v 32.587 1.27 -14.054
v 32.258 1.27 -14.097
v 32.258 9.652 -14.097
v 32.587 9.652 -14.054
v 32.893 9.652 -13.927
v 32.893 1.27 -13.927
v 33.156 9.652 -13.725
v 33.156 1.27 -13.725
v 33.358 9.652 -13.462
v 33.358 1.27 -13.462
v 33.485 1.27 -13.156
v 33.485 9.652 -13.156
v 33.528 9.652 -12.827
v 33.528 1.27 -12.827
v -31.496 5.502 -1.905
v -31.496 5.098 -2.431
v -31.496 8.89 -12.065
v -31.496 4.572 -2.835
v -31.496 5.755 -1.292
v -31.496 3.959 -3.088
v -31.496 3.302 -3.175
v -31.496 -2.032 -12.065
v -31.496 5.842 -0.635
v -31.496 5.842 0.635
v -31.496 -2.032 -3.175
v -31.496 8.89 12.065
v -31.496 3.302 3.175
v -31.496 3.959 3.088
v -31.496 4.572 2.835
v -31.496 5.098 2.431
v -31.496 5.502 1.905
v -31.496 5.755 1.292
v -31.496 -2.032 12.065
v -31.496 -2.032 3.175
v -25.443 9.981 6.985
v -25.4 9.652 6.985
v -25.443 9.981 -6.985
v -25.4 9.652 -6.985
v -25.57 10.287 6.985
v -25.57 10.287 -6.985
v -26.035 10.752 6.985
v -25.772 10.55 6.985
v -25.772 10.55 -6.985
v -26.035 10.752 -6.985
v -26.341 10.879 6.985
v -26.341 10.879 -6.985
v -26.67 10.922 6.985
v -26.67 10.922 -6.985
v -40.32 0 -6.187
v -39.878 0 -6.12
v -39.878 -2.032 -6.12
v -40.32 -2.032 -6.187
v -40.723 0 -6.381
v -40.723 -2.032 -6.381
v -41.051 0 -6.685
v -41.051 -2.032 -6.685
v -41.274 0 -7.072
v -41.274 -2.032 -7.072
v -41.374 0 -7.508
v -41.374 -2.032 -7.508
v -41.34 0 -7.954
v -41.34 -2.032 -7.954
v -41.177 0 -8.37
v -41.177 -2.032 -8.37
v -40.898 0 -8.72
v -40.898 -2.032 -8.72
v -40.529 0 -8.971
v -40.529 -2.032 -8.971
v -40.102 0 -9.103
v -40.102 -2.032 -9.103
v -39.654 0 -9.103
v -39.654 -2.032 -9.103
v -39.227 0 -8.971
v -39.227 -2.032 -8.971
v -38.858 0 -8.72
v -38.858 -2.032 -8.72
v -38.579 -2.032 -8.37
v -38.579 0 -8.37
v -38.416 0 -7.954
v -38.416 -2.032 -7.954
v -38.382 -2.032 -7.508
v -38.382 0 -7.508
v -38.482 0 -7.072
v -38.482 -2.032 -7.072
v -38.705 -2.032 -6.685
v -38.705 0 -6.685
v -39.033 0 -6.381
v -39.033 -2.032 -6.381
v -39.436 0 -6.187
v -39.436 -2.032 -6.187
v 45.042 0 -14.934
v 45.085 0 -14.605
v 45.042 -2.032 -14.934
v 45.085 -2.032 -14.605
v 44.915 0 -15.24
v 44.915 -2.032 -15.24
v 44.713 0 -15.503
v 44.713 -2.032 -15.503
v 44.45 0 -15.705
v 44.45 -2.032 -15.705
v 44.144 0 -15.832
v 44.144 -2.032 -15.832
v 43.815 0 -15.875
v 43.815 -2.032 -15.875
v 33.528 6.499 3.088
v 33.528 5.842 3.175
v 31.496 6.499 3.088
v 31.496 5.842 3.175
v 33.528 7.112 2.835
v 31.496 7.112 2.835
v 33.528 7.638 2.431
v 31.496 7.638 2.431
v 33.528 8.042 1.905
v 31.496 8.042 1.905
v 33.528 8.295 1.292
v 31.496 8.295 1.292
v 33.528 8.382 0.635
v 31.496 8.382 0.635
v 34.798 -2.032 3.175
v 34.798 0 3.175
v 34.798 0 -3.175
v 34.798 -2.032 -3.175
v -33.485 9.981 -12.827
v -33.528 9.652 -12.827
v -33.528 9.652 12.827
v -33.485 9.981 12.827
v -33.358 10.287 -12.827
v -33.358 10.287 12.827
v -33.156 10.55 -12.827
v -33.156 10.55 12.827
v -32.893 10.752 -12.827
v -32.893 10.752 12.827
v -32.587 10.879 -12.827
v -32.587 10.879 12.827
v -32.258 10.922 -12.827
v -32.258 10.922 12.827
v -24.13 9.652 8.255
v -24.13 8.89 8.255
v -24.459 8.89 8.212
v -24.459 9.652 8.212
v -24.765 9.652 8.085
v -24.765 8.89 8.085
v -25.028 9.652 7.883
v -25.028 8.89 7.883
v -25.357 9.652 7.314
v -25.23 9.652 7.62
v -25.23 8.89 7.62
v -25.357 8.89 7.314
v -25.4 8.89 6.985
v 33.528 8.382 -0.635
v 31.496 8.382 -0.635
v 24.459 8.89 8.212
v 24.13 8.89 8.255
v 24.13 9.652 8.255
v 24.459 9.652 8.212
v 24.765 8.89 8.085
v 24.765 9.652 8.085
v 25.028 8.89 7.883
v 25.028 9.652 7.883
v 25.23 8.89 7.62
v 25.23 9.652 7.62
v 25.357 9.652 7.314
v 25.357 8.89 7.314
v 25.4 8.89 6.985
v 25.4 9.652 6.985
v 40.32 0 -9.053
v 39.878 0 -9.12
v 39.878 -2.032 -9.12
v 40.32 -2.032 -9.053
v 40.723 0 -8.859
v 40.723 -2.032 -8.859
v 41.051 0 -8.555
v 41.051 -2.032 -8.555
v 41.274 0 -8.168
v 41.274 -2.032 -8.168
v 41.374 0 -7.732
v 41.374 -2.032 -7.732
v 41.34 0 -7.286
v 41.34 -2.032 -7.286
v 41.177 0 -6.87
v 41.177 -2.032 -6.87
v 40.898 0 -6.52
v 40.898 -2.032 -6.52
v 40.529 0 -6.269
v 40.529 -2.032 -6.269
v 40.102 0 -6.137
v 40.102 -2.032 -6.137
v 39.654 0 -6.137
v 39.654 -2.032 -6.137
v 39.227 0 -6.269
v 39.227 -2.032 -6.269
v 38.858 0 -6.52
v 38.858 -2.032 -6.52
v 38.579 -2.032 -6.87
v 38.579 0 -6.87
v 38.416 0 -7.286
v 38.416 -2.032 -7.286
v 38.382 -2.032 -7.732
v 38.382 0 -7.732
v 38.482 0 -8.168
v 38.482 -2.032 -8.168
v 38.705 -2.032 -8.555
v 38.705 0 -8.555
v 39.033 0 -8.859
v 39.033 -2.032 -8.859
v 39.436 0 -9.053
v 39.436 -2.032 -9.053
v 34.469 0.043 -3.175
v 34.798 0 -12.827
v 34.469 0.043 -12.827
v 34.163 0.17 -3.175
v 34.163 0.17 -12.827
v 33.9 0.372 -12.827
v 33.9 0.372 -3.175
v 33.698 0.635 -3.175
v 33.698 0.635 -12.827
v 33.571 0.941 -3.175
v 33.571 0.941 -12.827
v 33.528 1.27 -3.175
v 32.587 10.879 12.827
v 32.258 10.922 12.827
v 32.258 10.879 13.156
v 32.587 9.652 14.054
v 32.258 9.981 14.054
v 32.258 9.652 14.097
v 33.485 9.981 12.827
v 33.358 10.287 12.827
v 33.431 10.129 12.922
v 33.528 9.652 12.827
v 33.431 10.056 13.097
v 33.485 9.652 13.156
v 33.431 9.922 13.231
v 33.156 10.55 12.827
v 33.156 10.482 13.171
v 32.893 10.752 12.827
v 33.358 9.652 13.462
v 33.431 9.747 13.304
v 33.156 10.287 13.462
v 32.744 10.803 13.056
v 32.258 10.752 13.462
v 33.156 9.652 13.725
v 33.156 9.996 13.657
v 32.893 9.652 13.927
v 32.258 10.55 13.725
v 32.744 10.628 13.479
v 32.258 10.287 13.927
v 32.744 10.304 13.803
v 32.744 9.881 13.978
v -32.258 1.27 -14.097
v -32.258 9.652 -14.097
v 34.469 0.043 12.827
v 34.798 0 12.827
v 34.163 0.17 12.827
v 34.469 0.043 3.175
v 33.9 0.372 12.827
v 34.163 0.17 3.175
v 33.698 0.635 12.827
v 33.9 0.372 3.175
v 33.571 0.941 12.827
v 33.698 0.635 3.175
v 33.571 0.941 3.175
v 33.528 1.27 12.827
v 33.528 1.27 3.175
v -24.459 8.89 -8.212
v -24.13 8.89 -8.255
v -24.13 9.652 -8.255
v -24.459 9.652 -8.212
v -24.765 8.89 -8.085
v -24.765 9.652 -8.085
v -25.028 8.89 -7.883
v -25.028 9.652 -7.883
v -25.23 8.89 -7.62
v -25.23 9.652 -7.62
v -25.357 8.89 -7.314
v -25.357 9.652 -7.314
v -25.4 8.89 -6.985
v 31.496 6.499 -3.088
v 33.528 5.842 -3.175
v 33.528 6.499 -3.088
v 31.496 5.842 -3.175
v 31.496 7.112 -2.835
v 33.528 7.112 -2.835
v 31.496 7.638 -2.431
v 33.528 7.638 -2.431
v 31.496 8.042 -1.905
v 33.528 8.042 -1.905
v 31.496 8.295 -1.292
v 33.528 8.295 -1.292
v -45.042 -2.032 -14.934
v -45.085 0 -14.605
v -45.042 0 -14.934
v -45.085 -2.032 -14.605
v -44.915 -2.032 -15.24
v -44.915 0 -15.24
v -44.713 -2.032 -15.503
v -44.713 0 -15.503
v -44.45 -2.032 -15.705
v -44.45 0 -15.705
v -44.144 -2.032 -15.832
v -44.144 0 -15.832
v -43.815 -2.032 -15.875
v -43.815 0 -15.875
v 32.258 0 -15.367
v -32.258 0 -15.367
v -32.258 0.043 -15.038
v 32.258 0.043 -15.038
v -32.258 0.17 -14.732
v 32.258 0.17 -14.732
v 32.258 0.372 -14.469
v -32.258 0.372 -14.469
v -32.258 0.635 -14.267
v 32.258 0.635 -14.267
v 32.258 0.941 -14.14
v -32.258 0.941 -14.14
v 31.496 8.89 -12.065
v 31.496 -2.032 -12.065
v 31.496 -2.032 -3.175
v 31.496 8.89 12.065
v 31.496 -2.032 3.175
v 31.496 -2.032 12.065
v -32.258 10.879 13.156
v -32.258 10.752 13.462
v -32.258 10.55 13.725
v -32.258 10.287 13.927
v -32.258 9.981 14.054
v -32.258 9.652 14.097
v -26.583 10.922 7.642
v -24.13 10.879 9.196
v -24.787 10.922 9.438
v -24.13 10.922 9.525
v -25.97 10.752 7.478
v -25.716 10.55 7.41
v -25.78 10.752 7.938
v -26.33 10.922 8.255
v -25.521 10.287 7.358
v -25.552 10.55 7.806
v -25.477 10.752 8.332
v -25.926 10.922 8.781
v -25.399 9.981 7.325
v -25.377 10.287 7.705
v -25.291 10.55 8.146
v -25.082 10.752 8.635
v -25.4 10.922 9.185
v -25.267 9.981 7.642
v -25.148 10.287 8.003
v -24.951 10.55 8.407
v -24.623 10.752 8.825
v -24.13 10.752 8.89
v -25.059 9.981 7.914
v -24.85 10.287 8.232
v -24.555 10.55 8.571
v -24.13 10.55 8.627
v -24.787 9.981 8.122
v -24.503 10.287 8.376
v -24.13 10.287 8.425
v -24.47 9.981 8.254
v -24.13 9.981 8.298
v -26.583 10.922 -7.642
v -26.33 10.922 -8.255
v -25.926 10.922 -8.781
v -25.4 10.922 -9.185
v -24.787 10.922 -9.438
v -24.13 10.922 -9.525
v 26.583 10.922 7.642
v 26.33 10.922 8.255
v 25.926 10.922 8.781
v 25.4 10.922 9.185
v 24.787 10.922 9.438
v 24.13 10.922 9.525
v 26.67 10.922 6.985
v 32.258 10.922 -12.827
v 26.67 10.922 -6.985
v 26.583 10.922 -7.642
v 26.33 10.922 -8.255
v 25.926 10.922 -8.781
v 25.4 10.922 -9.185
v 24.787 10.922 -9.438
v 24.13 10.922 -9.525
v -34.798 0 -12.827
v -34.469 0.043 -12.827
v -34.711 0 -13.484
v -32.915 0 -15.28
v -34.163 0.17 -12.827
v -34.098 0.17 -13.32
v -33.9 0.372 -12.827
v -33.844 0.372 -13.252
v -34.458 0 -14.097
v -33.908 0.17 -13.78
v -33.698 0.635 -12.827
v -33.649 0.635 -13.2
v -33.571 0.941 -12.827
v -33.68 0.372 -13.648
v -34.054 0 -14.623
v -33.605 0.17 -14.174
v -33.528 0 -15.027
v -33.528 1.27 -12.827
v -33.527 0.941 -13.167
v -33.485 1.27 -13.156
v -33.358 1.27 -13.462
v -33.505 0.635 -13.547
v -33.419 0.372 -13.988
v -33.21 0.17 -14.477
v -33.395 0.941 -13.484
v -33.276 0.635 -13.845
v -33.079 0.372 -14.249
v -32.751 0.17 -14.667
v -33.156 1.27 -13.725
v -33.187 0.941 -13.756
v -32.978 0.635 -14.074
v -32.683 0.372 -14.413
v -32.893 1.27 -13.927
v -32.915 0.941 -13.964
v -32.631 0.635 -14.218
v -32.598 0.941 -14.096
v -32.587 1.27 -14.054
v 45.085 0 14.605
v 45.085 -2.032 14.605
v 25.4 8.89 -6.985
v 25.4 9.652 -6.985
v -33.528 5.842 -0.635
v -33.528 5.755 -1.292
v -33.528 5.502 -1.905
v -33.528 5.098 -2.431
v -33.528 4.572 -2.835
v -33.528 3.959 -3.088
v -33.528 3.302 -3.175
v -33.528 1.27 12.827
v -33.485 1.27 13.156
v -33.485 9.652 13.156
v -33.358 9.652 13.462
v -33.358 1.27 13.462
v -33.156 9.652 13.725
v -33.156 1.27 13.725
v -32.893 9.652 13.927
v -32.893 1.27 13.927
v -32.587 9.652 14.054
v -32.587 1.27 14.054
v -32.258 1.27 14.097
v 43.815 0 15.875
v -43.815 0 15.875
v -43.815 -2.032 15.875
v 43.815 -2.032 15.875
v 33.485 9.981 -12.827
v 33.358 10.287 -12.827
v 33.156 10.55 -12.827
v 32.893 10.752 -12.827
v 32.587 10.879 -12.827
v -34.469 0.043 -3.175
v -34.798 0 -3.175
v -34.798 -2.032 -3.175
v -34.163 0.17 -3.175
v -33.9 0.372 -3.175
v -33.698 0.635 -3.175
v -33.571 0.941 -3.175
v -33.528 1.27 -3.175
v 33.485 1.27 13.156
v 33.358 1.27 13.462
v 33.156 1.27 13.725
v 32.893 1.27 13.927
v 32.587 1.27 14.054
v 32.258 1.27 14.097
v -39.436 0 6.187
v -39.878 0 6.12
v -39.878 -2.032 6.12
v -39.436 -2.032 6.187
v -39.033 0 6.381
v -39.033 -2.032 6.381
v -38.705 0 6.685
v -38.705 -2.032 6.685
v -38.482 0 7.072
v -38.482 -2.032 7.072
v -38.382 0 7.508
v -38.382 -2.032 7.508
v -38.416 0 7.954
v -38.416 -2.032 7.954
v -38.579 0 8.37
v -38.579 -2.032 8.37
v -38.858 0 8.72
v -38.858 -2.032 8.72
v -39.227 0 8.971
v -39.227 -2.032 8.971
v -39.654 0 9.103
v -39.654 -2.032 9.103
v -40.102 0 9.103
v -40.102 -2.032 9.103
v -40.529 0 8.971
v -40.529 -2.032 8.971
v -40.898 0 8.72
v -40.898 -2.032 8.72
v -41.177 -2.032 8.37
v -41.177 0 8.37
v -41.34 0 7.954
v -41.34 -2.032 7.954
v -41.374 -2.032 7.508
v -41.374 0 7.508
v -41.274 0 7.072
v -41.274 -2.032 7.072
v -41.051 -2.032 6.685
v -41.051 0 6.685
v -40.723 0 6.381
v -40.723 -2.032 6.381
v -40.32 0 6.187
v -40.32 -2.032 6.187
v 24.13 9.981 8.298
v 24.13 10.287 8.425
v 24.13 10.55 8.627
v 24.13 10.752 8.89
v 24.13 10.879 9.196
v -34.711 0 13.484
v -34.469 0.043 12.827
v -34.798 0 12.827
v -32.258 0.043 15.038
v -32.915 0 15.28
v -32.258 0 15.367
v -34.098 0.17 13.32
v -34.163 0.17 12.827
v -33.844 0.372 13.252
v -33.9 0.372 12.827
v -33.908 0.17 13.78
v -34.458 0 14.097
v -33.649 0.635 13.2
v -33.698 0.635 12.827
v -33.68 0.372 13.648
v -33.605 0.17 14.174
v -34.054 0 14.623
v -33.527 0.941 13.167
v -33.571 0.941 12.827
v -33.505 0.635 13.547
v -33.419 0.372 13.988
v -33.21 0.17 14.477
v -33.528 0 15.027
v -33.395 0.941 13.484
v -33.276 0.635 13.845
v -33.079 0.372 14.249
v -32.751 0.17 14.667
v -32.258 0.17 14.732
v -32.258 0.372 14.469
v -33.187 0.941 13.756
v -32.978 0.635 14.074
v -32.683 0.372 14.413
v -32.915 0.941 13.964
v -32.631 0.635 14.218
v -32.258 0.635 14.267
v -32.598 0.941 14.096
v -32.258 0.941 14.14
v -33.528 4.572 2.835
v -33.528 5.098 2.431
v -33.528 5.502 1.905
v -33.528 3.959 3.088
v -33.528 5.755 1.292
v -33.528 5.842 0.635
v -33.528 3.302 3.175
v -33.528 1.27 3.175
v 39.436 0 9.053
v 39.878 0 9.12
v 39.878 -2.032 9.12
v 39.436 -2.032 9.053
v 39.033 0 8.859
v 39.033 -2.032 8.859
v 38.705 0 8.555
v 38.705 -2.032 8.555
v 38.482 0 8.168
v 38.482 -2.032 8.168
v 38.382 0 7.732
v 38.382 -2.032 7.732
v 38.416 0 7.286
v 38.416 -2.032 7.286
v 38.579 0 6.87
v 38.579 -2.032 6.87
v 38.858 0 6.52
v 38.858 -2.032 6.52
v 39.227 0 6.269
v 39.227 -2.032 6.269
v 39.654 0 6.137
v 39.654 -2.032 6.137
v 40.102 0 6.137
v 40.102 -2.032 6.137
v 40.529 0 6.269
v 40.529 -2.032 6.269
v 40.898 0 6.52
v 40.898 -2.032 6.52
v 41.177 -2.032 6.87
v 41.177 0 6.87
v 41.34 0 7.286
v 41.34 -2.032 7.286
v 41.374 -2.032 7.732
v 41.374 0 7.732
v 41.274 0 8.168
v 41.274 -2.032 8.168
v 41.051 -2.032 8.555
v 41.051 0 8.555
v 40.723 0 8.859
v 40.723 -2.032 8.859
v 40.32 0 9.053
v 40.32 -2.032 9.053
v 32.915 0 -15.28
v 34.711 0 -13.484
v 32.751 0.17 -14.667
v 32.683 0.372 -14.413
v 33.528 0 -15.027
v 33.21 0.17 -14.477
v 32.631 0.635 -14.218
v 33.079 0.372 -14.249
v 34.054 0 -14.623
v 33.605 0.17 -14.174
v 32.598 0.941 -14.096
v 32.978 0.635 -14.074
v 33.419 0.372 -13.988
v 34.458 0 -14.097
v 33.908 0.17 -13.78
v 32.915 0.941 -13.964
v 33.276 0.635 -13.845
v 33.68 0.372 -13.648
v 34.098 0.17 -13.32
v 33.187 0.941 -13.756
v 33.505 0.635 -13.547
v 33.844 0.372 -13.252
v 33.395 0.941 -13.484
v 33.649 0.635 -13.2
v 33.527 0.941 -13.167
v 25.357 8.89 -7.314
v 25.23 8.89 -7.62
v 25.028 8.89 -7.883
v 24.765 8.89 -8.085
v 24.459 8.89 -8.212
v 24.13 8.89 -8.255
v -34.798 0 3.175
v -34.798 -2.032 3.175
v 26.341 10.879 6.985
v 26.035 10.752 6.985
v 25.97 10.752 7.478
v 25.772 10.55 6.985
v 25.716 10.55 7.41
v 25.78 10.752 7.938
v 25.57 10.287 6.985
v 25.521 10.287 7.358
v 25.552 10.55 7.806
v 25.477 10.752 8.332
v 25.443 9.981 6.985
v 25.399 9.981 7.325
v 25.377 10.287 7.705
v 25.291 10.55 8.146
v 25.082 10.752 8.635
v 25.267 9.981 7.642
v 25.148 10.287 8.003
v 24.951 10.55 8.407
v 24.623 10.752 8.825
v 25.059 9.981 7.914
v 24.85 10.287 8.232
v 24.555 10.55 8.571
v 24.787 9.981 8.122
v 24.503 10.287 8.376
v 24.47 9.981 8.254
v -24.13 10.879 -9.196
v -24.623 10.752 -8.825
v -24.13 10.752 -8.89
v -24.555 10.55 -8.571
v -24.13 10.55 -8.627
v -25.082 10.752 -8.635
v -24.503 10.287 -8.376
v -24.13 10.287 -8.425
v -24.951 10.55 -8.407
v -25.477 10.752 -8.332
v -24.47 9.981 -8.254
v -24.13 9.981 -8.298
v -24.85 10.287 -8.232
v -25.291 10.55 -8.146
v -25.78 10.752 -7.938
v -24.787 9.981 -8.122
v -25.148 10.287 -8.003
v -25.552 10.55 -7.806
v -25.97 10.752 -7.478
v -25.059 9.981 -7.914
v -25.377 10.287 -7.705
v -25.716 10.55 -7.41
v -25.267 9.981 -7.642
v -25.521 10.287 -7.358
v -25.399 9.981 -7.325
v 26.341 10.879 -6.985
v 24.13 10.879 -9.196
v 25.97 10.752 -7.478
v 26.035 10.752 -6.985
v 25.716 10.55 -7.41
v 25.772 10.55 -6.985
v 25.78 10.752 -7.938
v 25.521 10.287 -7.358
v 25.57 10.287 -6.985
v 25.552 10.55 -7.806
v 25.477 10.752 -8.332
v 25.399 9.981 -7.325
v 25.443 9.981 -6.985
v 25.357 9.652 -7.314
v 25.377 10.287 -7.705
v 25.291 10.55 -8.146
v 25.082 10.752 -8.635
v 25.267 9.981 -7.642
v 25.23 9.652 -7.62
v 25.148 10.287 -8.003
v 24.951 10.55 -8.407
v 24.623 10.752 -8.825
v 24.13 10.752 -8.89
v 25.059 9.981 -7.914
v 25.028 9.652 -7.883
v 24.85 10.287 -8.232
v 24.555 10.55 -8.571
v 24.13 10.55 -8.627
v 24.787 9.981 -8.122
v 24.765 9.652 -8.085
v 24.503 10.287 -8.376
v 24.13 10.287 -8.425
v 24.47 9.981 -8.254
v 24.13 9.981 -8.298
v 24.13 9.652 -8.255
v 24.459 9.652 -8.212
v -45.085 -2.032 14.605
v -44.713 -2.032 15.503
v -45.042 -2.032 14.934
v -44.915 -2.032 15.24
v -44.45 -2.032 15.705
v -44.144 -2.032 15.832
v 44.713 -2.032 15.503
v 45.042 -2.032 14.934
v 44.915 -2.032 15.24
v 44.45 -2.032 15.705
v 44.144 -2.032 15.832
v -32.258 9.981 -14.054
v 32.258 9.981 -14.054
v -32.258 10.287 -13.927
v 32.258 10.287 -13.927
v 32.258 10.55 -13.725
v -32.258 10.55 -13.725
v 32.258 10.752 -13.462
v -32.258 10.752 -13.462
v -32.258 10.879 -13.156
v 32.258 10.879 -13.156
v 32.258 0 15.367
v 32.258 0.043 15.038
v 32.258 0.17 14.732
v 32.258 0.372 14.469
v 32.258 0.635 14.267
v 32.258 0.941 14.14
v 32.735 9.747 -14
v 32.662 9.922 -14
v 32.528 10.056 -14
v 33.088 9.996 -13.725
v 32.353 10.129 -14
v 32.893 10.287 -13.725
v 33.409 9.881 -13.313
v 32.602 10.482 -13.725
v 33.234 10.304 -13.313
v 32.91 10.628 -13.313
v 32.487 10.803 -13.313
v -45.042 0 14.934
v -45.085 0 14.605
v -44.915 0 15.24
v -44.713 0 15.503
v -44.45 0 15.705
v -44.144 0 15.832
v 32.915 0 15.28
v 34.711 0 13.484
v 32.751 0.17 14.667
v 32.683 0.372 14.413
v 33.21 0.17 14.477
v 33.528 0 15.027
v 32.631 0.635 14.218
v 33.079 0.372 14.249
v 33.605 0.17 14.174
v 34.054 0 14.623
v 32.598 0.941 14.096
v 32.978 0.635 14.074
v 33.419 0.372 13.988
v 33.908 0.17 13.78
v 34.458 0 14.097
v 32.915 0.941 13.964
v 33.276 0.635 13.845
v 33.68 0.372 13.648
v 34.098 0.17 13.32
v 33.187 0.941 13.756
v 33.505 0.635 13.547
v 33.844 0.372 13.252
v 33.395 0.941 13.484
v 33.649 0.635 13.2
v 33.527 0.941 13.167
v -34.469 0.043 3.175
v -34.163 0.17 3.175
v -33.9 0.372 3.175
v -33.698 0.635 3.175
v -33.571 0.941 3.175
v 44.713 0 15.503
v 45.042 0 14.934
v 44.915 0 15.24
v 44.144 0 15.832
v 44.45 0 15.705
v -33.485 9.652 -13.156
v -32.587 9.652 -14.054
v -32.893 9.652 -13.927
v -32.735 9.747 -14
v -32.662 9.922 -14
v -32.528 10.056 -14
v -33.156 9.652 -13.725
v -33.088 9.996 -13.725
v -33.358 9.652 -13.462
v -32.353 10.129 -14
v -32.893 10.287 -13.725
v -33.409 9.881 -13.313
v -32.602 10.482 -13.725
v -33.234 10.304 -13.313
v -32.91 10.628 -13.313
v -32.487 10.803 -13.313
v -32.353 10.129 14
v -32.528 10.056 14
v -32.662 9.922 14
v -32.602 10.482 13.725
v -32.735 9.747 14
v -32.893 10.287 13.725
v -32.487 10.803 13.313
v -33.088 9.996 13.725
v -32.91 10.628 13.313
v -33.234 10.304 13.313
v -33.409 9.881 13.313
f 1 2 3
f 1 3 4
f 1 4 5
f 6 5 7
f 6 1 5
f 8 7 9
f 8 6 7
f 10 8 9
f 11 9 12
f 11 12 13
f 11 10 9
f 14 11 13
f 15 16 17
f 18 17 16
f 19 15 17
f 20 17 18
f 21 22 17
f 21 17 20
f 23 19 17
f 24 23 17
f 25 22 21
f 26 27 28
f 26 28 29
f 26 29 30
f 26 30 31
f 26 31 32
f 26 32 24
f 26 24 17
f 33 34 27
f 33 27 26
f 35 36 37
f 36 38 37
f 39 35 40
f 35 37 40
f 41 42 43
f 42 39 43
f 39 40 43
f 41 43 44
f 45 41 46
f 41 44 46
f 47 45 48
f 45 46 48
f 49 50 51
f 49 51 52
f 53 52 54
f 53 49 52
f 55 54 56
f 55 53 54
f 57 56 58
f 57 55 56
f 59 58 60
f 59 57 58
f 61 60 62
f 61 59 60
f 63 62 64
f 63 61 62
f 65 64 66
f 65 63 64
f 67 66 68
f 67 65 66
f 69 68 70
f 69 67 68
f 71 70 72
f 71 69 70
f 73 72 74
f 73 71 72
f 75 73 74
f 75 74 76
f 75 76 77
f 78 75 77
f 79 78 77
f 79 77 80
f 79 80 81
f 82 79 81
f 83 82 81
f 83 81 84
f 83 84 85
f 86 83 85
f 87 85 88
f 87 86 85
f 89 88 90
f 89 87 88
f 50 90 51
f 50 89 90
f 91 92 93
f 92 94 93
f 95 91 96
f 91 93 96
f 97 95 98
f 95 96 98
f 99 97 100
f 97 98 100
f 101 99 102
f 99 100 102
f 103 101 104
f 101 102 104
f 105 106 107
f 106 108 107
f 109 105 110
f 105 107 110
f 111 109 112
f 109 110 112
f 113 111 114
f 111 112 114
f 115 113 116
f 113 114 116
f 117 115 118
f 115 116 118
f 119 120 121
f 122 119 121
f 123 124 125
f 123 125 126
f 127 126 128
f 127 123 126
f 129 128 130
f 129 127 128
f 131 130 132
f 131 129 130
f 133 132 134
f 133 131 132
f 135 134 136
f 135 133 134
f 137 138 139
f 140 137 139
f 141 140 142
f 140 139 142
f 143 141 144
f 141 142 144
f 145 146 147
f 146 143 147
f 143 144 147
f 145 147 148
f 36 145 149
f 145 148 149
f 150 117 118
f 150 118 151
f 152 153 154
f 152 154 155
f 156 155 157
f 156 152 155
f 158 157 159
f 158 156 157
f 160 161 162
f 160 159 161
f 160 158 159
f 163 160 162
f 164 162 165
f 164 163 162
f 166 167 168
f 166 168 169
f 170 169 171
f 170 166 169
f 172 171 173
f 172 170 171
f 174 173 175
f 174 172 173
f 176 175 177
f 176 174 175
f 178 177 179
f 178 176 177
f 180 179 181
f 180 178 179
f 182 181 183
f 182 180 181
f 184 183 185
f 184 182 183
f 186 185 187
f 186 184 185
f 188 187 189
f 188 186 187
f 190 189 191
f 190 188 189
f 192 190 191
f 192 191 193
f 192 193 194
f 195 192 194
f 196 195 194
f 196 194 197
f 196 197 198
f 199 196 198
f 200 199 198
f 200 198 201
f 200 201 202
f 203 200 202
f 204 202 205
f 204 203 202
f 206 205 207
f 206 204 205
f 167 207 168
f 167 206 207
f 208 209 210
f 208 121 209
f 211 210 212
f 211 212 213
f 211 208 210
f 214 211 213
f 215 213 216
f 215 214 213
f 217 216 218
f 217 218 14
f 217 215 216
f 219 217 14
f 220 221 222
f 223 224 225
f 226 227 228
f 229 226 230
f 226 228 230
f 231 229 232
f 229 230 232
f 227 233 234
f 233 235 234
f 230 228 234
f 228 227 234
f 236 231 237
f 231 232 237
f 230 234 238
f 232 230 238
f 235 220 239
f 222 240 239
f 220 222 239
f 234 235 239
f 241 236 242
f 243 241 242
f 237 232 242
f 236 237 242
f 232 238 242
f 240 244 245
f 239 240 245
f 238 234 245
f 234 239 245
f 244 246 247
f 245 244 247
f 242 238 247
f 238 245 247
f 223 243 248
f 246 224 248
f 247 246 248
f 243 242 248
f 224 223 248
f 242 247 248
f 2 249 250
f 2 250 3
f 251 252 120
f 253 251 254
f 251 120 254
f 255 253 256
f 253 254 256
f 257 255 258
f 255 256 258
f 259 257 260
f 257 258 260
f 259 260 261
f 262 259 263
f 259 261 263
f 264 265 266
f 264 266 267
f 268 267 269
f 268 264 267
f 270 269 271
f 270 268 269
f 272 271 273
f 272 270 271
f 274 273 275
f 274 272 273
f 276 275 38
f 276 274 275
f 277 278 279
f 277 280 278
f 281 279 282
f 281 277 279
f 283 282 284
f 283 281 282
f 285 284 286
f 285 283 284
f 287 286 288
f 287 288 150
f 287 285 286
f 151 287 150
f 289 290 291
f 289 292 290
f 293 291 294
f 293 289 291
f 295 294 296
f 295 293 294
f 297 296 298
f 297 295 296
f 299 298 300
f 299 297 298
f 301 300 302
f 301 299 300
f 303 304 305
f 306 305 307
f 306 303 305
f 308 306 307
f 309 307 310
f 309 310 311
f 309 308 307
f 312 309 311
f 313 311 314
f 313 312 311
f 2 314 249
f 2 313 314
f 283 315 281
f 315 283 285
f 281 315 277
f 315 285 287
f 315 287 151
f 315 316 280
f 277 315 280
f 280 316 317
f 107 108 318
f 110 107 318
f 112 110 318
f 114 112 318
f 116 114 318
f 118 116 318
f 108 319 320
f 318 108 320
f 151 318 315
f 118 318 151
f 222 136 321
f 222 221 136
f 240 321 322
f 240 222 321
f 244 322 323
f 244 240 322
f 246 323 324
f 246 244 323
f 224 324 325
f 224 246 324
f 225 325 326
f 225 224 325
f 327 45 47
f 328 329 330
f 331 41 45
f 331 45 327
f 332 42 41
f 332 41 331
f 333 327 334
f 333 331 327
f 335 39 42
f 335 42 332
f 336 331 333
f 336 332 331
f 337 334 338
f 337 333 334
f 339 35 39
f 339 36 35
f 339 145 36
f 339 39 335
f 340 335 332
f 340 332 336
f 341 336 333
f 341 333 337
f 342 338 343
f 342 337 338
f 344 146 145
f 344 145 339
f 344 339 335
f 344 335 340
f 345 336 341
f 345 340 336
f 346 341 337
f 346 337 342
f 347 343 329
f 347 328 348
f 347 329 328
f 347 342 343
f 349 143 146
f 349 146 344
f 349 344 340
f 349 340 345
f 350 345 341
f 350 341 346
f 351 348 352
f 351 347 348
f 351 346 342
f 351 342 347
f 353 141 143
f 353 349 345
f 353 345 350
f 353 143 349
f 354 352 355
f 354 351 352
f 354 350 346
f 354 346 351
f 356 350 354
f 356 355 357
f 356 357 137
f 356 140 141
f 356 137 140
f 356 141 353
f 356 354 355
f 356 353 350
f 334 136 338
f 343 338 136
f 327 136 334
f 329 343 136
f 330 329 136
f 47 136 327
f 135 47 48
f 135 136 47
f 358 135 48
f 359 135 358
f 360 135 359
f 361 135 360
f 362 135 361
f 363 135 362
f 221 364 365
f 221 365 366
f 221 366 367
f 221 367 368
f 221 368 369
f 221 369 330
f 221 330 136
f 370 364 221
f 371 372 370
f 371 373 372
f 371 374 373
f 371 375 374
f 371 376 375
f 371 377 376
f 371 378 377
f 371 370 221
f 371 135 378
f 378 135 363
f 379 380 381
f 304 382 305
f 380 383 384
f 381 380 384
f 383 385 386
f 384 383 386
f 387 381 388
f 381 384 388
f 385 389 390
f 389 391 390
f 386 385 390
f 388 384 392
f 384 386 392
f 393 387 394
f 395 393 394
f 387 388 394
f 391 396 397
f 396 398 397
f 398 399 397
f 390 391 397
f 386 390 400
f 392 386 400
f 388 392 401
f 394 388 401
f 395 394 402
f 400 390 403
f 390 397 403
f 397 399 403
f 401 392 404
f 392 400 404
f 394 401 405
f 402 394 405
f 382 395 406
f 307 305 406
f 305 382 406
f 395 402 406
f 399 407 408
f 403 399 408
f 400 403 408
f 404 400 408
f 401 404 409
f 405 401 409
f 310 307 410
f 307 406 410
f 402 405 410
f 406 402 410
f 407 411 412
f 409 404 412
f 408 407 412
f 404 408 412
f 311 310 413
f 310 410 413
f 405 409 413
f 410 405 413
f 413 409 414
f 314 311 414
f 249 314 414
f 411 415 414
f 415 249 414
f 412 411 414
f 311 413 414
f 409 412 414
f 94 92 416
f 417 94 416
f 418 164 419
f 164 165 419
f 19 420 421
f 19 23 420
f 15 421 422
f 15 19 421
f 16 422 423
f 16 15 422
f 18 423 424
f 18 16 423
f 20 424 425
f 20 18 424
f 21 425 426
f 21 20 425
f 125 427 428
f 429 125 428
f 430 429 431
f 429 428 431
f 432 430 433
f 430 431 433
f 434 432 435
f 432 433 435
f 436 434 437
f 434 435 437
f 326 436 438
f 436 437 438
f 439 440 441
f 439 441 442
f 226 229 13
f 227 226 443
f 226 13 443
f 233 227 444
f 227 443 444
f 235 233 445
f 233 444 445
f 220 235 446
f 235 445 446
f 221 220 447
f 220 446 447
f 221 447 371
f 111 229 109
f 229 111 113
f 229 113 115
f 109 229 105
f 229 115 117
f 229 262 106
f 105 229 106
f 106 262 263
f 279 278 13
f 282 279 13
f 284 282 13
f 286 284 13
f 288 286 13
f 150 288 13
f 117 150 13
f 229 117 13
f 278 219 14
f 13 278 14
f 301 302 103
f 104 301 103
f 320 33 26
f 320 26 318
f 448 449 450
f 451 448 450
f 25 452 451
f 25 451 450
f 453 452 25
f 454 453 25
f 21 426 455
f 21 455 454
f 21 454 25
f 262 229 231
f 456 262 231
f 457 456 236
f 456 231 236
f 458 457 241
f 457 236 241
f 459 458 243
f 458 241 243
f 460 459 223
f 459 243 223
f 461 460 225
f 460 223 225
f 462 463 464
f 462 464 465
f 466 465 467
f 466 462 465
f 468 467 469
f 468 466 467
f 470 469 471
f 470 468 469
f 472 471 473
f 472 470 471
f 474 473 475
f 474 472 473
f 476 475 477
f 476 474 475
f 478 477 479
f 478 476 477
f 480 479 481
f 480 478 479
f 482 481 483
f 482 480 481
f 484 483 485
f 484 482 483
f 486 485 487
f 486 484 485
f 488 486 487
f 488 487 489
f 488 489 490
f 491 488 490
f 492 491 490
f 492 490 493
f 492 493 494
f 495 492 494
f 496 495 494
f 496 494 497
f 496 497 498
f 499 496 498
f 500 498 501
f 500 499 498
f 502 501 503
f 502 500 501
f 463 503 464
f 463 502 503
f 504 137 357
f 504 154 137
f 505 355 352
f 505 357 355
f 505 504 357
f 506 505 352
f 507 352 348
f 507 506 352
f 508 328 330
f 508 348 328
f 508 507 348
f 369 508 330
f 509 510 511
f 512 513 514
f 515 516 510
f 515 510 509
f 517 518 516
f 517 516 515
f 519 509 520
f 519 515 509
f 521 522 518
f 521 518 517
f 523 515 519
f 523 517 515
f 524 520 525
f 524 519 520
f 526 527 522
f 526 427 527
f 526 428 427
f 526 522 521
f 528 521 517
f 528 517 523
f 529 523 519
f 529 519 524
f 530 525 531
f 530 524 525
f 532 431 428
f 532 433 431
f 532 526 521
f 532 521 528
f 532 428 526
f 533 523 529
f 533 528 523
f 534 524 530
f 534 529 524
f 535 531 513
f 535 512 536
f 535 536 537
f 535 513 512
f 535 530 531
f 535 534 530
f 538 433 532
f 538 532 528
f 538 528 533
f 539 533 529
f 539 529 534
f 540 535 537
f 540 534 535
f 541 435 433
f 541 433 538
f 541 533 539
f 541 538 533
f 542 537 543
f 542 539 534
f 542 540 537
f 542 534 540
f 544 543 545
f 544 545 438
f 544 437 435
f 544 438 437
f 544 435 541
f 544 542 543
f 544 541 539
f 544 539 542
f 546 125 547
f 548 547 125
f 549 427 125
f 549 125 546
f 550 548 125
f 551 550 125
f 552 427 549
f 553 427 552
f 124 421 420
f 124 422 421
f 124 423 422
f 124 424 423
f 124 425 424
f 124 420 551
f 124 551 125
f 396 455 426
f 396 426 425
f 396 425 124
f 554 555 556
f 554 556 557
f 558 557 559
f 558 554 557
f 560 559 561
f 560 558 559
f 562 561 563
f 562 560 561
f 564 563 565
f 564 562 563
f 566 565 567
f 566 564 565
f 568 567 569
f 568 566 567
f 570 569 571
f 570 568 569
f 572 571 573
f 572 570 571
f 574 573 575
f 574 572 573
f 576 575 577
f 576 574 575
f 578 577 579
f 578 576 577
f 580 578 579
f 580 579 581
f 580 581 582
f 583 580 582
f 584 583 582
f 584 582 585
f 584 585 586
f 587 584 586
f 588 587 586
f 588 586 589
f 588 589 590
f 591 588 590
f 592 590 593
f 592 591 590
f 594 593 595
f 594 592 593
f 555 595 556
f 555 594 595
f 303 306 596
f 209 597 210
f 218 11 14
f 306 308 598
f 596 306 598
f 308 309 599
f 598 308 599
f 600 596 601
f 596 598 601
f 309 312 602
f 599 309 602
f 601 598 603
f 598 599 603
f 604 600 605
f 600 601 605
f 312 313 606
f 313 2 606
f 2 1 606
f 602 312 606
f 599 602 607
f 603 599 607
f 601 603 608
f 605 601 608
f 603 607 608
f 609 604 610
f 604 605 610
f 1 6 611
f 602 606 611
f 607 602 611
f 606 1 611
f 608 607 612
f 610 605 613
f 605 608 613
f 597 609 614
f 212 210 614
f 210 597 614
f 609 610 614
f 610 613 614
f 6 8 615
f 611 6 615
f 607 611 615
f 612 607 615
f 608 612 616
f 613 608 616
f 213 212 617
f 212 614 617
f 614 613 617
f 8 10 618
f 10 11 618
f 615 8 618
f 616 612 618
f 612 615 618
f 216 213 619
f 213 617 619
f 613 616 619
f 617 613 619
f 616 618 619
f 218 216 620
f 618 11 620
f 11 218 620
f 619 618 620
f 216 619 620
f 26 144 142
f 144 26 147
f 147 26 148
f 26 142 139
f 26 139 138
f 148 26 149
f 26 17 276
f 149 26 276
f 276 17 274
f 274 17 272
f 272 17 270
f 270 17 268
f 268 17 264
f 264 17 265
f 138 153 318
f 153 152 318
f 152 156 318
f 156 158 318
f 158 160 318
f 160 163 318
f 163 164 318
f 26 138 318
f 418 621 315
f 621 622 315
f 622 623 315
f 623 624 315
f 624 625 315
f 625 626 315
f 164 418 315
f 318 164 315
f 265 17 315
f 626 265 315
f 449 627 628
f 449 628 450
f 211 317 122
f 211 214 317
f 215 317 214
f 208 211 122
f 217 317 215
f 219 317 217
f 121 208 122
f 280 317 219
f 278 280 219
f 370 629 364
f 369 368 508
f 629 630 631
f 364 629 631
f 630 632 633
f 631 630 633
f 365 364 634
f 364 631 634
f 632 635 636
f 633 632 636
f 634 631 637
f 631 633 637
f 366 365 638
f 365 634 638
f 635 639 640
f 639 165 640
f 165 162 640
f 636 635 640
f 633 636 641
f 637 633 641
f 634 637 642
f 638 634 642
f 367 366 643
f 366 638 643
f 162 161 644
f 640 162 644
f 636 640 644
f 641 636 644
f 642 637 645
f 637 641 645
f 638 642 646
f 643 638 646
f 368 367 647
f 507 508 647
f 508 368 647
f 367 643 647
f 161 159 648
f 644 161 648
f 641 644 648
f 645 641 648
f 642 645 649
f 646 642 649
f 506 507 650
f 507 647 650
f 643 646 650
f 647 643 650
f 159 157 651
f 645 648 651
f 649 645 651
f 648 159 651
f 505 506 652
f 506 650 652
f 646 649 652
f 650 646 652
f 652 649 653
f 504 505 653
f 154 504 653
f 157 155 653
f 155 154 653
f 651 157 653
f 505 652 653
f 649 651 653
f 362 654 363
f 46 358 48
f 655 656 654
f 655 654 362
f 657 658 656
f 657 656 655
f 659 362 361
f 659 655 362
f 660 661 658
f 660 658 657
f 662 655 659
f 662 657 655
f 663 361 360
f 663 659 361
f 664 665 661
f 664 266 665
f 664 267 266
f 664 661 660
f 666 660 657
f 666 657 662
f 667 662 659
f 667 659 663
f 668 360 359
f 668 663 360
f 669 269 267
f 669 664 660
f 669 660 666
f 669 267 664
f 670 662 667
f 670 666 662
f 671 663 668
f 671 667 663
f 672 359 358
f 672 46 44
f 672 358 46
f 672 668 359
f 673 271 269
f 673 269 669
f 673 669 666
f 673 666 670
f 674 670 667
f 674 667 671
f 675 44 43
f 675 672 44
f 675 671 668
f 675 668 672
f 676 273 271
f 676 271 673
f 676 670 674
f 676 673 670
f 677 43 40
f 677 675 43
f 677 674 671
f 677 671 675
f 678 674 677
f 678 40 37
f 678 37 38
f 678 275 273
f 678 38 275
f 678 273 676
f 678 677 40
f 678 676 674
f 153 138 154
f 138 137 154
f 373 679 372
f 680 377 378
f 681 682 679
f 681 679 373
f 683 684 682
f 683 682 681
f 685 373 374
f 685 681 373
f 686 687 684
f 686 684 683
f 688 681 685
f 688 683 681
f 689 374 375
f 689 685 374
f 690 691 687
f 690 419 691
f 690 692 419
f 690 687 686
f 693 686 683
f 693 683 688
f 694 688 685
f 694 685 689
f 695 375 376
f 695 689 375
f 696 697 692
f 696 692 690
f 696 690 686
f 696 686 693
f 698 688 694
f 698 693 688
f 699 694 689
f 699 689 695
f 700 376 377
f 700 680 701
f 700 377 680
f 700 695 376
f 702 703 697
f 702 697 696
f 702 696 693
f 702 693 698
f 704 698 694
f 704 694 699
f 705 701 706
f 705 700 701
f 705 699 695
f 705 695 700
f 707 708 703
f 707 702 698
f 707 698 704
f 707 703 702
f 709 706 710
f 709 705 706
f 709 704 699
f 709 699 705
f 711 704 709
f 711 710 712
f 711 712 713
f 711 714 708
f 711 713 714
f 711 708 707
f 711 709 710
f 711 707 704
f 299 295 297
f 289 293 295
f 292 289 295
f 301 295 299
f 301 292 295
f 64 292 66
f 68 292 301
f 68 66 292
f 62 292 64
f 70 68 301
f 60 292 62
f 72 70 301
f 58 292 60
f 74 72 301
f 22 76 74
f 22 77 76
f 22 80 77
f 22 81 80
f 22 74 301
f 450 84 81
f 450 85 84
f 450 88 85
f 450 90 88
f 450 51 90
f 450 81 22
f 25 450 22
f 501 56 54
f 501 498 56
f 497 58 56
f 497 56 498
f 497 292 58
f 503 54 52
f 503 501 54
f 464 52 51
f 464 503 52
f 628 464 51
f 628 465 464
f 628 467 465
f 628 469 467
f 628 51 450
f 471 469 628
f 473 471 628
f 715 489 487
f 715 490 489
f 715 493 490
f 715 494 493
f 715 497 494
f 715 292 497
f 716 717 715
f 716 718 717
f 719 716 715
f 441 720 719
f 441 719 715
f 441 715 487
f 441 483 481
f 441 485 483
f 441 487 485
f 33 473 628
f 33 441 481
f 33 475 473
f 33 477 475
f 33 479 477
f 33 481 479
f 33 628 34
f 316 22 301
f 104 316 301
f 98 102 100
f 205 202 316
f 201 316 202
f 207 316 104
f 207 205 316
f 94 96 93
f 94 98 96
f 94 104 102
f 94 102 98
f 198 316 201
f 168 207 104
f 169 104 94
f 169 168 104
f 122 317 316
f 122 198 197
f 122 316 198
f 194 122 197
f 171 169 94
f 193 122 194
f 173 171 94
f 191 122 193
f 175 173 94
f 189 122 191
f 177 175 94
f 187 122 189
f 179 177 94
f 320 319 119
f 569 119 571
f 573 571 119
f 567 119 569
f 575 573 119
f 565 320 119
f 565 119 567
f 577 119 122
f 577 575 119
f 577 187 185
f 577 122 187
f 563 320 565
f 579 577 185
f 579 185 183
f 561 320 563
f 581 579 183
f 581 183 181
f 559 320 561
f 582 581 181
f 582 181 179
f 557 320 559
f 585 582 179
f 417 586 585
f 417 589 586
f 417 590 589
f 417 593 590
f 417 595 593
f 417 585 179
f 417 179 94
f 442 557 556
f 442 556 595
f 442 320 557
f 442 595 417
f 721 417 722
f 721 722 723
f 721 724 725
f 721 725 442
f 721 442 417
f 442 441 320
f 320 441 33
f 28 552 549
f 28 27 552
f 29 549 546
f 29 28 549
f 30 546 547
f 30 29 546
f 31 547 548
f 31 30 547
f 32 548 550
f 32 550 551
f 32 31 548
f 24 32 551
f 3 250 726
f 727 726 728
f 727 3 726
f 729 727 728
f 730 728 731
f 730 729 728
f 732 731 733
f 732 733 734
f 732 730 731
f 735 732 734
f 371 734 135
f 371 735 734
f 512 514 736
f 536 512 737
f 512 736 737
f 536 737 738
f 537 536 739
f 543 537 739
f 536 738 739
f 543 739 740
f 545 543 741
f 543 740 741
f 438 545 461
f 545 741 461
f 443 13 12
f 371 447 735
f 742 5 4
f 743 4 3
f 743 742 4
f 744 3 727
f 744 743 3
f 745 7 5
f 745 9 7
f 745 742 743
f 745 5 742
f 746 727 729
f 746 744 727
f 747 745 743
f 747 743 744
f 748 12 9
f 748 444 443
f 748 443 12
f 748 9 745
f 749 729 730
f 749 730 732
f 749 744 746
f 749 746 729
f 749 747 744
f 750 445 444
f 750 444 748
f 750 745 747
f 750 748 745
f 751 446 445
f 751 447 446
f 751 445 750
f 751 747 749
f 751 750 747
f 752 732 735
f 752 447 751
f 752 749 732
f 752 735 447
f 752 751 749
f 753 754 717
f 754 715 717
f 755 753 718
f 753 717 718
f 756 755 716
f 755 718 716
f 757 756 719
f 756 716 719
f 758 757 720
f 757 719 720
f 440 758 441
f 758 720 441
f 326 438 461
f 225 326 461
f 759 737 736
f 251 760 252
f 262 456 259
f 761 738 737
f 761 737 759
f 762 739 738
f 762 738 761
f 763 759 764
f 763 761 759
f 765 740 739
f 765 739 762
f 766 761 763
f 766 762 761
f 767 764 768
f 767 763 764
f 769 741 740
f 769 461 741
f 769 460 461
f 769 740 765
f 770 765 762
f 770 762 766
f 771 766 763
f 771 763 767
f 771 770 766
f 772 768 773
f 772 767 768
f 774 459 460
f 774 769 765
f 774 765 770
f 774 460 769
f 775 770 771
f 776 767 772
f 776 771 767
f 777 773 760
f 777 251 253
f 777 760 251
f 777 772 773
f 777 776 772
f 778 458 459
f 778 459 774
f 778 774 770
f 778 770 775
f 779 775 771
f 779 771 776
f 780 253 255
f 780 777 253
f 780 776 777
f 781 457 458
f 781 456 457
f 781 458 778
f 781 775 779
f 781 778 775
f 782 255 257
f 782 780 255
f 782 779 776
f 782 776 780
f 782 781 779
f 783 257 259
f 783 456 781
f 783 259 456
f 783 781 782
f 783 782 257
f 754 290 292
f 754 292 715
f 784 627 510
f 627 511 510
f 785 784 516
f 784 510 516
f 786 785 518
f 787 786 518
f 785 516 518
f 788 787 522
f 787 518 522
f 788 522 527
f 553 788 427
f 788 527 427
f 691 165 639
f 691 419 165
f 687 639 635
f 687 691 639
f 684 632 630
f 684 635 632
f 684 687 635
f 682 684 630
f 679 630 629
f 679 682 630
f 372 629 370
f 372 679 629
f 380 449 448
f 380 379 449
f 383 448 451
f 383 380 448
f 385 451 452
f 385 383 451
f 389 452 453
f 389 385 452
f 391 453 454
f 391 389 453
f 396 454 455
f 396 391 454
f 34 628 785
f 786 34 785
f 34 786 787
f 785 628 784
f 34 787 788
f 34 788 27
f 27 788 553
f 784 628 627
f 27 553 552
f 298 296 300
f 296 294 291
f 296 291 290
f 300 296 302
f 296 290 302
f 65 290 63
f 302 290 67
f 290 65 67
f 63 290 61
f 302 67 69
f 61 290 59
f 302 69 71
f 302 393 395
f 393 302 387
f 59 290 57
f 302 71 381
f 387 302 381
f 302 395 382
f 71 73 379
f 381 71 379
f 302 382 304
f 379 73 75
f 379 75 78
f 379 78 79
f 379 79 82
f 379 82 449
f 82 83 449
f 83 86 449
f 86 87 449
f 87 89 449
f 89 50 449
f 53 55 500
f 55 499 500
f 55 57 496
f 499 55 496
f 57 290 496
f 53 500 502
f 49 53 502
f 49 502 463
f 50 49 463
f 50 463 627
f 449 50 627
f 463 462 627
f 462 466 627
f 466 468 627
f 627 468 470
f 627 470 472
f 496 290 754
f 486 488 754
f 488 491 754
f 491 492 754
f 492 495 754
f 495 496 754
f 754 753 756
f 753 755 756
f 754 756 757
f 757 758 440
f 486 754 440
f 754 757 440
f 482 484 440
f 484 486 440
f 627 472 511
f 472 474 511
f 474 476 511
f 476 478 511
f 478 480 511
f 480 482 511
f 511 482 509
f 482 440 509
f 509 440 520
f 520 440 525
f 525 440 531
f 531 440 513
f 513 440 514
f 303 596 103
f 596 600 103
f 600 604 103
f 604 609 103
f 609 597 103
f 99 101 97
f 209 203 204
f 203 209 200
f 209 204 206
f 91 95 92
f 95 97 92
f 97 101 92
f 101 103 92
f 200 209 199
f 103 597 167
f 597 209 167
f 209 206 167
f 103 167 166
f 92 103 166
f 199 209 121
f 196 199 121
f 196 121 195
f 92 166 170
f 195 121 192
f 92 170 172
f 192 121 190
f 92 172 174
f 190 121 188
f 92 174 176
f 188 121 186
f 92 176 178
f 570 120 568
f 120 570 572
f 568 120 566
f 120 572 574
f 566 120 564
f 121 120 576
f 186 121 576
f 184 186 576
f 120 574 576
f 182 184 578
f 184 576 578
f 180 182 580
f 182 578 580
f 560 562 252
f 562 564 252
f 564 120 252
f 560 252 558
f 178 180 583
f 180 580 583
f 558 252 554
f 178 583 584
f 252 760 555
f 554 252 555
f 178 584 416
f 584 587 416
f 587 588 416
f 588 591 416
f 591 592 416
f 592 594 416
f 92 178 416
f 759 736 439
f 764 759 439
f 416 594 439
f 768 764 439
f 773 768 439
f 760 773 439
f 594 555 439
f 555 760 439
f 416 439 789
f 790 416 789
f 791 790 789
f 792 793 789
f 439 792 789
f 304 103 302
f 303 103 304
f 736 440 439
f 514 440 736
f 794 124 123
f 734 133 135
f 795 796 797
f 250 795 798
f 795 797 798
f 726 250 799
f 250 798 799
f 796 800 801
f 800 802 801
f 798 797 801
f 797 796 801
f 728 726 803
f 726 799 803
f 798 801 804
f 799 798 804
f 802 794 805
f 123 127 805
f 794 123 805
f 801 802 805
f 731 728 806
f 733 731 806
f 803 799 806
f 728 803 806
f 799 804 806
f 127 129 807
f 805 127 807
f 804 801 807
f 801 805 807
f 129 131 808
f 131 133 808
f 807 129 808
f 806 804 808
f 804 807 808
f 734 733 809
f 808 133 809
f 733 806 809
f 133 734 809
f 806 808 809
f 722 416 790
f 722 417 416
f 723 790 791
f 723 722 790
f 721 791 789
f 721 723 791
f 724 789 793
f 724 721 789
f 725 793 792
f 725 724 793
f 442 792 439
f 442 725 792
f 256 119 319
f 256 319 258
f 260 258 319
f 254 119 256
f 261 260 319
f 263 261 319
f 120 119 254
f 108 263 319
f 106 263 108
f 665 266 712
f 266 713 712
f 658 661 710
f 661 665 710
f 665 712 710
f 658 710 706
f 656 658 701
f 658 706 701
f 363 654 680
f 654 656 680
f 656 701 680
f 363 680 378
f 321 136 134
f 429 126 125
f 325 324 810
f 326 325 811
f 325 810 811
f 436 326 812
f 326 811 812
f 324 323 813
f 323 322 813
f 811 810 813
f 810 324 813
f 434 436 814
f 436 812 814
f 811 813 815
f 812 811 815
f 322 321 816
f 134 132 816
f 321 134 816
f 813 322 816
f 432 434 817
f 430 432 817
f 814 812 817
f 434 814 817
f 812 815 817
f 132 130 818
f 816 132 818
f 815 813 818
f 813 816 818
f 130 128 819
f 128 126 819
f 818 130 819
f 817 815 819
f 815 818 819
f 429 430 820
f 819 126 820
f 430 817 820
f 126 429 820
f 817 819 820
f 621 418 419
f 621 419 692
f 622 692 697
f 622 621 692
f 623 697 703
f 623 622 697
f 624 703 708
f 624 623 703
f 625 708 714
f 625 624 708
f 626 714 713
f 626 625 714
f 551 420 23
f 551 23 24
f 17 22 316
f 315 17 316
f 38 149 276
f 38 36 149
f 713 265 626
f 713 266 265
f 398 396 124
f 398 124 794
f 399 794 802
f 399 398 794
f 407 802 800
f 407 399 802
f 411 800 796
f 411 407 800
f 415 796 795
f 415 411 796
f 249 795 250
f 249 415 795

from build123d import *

# Parameters (mm, degrees)
SKETCH1_W           = 62.992
SKETCH1_H           = 24.13
BOSS_EXTRUDE1_DEPTH = 8.89
SHELL1_T            = 2.032
SKETCH2_W           = 6.35
SKETCH2_H           = 5.842
CUT_EXTRUDE1_DEPTH  = 8.89
SKETCH3_W           = 6.35
SKETCH3_H           = 8.382
CUT_EXTRUDE2_DEPTH  = 8.89
FILLET1_R           = 2.54
SKETCH4_W           = 90.17
SKETCH4_H           = 31.75
SKETCH4_R           = 1.5
BOSS_EXTRUDE2_DEPTH = 2.032
SKETCH5_W           = 62.992
SKETCH5_H           = 24.13
CUT_EXTRUDE3_DEPTH  = 10.922
FILLET2_R           = 1.27
SKETCH6_W           = 50.8
SKETCH6_H           = 16.51
CUT_EXTRUDE4_DEPTH  = 10.922
FILLET3_R           = 1.27
SKETCH8_W           = 3.302
SKETCH8_H           = 6.35
CUT_EXTRUDE5_DEPTH  = 10.922


with BuildPart() as part:
    # Sketch1 → Boss-Extrude1 (new body)
    with BuildSketch(Plane(origin=(0, 0, 0), x_dir=(1, 0, 0), z_dir=(0, 1, 0))):
        Rectangle(SKETCH1_W, SKETCH1_H)
    extrude(amount=BOSS_EXTRUDE1_DEPTH)

    # Shell1
    shell1_openings = [part.faces().sort_by_distance(p)[0] for p in [
        (0, 0, 0),
    ]]
    offset(amount=SHELL1_T, openings=shell1_openings, kind=Kind.INTERSECTION)

    # Sketch2 → Cut-Extrude1 (cut)
    with BuildSketch(Plane.ZY.offset(33.528)):
        with Locations((0, 2.921)):
            Rectangle(SKETCH2_W, SKETCH2_H)
    extrude(amount=-CUT_EXTRUDE1_DEPTH, mode=Mode.SUBTRACT)

    # Sketch3 → Cut-Extrude2 (cut)
    with BuildSketch(Plane(origin=(33.528, 0, 0), x_dir=(0, 0, -1), z_dir=(1, 0, 0))):
        with Locations((0, 4.191)):
            Rectangle(SKETCH3_W, SKETCH3_H)
    extrude(amount=-CUT_EXTRUDE2_DEPTH, mode=Mode.SUBTRACT)

    # Fillet1
    fillet1_edges = [part.edges().sort_by_distance(p)[0] for p in [
        (-32.512, 5.842, 3.175),
        (-32.512, 5.842, -3.175),
        (32.512, 8.382, -3.175),
        (32.512, 8.382, 3.175),
    ]]
    fillet(fillet1_edges, radius=FILLET1_R)

    # Sketch4 → Boss-Extrude2 (add)
    with BuildSketch(Plane.XZ):
        Rectangle(SKETCH4_W, SKETCH4_H)
        with Locations((-39.878, 7.62)):
            Circle(SKETCH4_R, mode=Mode.SUBTRACT)
        with Locations((-39.878, -7.62)):
            Circle(SKETCH4_R, mode=Mode.SUBTRACT)
        with Locations((39.878, -7.62)):
            Circle(SKETCH4_R, mode=Mode.SUBTRACT)
        with Locations((39.878, 7.62)):
            Circle(SKETCH4_R, mode=Mode.SUBTRACT)
    extrude(amount=BOSS_EXTRUDE2_DEPTH)

    # Sketch5 → Cut-Extrude3 (cut)
    with BuildSketch(Plane.XZ.offset(2.032)):
        Rectangle(SKETCH5_W, SKETCH5_H)
    extrude(amount=-CUT_EXTRUDE3_DEPTH, mode=Mode.SUBTRACT)

    # Fillet2
    fillet2_edges = [part.edges().sort_by_distance(p)[0] for p in [
        (0, 10.922, 14.097),
        (-33.528, 10.922, 0),
        (0, 10.922, -14.097),
        (33.528, 10.922, 0),
        (-45.085, -1.016, 15.875),
        (-45.085, -1.016, -15.875),
        (45.085, -1.016, -15.875),
        (45.085, -1.016, 15.875),
        (-33.528, 5.461, -14.097),
        (-33.528, 5.461, 14.097),
        (33.528, 5.461, 14.097),
        (33.528, 5.461, -14.097),
    ]]
    fillet(fillet2_edges, radius=FILLET2_R)
    fillet2_2_edges = [part.edges().sort_by_distance(p)[0] for p in [
        (0, 0, -14.097),
        (33.528, 0, -8.001),
        (33.528, 0, 8.001),
        (0, 0, 14.097),
        (-33.528, 0, 8.001),
        (-33.528, 0, -8.001),
        (-33.156025612, 0, -13.725025612),
        (-33.156025612, 0, 13.725025612),
        (33.156025612, 0, 13.725025612),
        (33.156025612, 0, -13.725025612),
    ]]
    fillet(fillet2_2_edges, radius=FILLET2_R)

    # Sketch6 → Cut-Extrude4 (cut)
    with BuildSketch(Plane(origin=(0, 10.922, 0), x_dir=(1, 0, 0), z_dir=(0, 1, 0))):
        Rectangle(SKETCH6_W, SKETCH6_H)
    extrude(amount=-CUT_EXTRUDE4_DEPTH, mode=Mode.SUBTRACT)

    # Fillet3
    fillet3_edges = [part.edges().sort_by_distance(p)[0] for p in [
        (-25.4, 10.922, 0),
        (0, 10.922, 8.255),
        (0, 10.922, -8.255),
        (25.4, 10.922, 0),
        (25.4, 9.906, -8.255),
        (25.4, 9.906, 8.255),
        (-25.4, 9.906, -8.255),
        (-25.4, 9.906, 8.255),
    ]]
    fillet(fillet3_edges, radius=FILLET3_R)

    # Sketch8 → Cut-Extrude5 (cut)
    with BuildSketch(Plane(origin=(0, 0, 0), x_dir=(1, 0, 0), z_dir=(0, 1, 0))):
        with Locations((-33.147, 0)):
            Rectangle(SKETCH8_W, SKETCH8_H)
        with Locations((33.147, 0)):
            Rectangle(SKETCH8_W, SKETCH8_H)
    extrude(amount=-CUT_EXTRUDE5_DEPTH, mode=Mode.SUBTRACT)


solid = part.part
